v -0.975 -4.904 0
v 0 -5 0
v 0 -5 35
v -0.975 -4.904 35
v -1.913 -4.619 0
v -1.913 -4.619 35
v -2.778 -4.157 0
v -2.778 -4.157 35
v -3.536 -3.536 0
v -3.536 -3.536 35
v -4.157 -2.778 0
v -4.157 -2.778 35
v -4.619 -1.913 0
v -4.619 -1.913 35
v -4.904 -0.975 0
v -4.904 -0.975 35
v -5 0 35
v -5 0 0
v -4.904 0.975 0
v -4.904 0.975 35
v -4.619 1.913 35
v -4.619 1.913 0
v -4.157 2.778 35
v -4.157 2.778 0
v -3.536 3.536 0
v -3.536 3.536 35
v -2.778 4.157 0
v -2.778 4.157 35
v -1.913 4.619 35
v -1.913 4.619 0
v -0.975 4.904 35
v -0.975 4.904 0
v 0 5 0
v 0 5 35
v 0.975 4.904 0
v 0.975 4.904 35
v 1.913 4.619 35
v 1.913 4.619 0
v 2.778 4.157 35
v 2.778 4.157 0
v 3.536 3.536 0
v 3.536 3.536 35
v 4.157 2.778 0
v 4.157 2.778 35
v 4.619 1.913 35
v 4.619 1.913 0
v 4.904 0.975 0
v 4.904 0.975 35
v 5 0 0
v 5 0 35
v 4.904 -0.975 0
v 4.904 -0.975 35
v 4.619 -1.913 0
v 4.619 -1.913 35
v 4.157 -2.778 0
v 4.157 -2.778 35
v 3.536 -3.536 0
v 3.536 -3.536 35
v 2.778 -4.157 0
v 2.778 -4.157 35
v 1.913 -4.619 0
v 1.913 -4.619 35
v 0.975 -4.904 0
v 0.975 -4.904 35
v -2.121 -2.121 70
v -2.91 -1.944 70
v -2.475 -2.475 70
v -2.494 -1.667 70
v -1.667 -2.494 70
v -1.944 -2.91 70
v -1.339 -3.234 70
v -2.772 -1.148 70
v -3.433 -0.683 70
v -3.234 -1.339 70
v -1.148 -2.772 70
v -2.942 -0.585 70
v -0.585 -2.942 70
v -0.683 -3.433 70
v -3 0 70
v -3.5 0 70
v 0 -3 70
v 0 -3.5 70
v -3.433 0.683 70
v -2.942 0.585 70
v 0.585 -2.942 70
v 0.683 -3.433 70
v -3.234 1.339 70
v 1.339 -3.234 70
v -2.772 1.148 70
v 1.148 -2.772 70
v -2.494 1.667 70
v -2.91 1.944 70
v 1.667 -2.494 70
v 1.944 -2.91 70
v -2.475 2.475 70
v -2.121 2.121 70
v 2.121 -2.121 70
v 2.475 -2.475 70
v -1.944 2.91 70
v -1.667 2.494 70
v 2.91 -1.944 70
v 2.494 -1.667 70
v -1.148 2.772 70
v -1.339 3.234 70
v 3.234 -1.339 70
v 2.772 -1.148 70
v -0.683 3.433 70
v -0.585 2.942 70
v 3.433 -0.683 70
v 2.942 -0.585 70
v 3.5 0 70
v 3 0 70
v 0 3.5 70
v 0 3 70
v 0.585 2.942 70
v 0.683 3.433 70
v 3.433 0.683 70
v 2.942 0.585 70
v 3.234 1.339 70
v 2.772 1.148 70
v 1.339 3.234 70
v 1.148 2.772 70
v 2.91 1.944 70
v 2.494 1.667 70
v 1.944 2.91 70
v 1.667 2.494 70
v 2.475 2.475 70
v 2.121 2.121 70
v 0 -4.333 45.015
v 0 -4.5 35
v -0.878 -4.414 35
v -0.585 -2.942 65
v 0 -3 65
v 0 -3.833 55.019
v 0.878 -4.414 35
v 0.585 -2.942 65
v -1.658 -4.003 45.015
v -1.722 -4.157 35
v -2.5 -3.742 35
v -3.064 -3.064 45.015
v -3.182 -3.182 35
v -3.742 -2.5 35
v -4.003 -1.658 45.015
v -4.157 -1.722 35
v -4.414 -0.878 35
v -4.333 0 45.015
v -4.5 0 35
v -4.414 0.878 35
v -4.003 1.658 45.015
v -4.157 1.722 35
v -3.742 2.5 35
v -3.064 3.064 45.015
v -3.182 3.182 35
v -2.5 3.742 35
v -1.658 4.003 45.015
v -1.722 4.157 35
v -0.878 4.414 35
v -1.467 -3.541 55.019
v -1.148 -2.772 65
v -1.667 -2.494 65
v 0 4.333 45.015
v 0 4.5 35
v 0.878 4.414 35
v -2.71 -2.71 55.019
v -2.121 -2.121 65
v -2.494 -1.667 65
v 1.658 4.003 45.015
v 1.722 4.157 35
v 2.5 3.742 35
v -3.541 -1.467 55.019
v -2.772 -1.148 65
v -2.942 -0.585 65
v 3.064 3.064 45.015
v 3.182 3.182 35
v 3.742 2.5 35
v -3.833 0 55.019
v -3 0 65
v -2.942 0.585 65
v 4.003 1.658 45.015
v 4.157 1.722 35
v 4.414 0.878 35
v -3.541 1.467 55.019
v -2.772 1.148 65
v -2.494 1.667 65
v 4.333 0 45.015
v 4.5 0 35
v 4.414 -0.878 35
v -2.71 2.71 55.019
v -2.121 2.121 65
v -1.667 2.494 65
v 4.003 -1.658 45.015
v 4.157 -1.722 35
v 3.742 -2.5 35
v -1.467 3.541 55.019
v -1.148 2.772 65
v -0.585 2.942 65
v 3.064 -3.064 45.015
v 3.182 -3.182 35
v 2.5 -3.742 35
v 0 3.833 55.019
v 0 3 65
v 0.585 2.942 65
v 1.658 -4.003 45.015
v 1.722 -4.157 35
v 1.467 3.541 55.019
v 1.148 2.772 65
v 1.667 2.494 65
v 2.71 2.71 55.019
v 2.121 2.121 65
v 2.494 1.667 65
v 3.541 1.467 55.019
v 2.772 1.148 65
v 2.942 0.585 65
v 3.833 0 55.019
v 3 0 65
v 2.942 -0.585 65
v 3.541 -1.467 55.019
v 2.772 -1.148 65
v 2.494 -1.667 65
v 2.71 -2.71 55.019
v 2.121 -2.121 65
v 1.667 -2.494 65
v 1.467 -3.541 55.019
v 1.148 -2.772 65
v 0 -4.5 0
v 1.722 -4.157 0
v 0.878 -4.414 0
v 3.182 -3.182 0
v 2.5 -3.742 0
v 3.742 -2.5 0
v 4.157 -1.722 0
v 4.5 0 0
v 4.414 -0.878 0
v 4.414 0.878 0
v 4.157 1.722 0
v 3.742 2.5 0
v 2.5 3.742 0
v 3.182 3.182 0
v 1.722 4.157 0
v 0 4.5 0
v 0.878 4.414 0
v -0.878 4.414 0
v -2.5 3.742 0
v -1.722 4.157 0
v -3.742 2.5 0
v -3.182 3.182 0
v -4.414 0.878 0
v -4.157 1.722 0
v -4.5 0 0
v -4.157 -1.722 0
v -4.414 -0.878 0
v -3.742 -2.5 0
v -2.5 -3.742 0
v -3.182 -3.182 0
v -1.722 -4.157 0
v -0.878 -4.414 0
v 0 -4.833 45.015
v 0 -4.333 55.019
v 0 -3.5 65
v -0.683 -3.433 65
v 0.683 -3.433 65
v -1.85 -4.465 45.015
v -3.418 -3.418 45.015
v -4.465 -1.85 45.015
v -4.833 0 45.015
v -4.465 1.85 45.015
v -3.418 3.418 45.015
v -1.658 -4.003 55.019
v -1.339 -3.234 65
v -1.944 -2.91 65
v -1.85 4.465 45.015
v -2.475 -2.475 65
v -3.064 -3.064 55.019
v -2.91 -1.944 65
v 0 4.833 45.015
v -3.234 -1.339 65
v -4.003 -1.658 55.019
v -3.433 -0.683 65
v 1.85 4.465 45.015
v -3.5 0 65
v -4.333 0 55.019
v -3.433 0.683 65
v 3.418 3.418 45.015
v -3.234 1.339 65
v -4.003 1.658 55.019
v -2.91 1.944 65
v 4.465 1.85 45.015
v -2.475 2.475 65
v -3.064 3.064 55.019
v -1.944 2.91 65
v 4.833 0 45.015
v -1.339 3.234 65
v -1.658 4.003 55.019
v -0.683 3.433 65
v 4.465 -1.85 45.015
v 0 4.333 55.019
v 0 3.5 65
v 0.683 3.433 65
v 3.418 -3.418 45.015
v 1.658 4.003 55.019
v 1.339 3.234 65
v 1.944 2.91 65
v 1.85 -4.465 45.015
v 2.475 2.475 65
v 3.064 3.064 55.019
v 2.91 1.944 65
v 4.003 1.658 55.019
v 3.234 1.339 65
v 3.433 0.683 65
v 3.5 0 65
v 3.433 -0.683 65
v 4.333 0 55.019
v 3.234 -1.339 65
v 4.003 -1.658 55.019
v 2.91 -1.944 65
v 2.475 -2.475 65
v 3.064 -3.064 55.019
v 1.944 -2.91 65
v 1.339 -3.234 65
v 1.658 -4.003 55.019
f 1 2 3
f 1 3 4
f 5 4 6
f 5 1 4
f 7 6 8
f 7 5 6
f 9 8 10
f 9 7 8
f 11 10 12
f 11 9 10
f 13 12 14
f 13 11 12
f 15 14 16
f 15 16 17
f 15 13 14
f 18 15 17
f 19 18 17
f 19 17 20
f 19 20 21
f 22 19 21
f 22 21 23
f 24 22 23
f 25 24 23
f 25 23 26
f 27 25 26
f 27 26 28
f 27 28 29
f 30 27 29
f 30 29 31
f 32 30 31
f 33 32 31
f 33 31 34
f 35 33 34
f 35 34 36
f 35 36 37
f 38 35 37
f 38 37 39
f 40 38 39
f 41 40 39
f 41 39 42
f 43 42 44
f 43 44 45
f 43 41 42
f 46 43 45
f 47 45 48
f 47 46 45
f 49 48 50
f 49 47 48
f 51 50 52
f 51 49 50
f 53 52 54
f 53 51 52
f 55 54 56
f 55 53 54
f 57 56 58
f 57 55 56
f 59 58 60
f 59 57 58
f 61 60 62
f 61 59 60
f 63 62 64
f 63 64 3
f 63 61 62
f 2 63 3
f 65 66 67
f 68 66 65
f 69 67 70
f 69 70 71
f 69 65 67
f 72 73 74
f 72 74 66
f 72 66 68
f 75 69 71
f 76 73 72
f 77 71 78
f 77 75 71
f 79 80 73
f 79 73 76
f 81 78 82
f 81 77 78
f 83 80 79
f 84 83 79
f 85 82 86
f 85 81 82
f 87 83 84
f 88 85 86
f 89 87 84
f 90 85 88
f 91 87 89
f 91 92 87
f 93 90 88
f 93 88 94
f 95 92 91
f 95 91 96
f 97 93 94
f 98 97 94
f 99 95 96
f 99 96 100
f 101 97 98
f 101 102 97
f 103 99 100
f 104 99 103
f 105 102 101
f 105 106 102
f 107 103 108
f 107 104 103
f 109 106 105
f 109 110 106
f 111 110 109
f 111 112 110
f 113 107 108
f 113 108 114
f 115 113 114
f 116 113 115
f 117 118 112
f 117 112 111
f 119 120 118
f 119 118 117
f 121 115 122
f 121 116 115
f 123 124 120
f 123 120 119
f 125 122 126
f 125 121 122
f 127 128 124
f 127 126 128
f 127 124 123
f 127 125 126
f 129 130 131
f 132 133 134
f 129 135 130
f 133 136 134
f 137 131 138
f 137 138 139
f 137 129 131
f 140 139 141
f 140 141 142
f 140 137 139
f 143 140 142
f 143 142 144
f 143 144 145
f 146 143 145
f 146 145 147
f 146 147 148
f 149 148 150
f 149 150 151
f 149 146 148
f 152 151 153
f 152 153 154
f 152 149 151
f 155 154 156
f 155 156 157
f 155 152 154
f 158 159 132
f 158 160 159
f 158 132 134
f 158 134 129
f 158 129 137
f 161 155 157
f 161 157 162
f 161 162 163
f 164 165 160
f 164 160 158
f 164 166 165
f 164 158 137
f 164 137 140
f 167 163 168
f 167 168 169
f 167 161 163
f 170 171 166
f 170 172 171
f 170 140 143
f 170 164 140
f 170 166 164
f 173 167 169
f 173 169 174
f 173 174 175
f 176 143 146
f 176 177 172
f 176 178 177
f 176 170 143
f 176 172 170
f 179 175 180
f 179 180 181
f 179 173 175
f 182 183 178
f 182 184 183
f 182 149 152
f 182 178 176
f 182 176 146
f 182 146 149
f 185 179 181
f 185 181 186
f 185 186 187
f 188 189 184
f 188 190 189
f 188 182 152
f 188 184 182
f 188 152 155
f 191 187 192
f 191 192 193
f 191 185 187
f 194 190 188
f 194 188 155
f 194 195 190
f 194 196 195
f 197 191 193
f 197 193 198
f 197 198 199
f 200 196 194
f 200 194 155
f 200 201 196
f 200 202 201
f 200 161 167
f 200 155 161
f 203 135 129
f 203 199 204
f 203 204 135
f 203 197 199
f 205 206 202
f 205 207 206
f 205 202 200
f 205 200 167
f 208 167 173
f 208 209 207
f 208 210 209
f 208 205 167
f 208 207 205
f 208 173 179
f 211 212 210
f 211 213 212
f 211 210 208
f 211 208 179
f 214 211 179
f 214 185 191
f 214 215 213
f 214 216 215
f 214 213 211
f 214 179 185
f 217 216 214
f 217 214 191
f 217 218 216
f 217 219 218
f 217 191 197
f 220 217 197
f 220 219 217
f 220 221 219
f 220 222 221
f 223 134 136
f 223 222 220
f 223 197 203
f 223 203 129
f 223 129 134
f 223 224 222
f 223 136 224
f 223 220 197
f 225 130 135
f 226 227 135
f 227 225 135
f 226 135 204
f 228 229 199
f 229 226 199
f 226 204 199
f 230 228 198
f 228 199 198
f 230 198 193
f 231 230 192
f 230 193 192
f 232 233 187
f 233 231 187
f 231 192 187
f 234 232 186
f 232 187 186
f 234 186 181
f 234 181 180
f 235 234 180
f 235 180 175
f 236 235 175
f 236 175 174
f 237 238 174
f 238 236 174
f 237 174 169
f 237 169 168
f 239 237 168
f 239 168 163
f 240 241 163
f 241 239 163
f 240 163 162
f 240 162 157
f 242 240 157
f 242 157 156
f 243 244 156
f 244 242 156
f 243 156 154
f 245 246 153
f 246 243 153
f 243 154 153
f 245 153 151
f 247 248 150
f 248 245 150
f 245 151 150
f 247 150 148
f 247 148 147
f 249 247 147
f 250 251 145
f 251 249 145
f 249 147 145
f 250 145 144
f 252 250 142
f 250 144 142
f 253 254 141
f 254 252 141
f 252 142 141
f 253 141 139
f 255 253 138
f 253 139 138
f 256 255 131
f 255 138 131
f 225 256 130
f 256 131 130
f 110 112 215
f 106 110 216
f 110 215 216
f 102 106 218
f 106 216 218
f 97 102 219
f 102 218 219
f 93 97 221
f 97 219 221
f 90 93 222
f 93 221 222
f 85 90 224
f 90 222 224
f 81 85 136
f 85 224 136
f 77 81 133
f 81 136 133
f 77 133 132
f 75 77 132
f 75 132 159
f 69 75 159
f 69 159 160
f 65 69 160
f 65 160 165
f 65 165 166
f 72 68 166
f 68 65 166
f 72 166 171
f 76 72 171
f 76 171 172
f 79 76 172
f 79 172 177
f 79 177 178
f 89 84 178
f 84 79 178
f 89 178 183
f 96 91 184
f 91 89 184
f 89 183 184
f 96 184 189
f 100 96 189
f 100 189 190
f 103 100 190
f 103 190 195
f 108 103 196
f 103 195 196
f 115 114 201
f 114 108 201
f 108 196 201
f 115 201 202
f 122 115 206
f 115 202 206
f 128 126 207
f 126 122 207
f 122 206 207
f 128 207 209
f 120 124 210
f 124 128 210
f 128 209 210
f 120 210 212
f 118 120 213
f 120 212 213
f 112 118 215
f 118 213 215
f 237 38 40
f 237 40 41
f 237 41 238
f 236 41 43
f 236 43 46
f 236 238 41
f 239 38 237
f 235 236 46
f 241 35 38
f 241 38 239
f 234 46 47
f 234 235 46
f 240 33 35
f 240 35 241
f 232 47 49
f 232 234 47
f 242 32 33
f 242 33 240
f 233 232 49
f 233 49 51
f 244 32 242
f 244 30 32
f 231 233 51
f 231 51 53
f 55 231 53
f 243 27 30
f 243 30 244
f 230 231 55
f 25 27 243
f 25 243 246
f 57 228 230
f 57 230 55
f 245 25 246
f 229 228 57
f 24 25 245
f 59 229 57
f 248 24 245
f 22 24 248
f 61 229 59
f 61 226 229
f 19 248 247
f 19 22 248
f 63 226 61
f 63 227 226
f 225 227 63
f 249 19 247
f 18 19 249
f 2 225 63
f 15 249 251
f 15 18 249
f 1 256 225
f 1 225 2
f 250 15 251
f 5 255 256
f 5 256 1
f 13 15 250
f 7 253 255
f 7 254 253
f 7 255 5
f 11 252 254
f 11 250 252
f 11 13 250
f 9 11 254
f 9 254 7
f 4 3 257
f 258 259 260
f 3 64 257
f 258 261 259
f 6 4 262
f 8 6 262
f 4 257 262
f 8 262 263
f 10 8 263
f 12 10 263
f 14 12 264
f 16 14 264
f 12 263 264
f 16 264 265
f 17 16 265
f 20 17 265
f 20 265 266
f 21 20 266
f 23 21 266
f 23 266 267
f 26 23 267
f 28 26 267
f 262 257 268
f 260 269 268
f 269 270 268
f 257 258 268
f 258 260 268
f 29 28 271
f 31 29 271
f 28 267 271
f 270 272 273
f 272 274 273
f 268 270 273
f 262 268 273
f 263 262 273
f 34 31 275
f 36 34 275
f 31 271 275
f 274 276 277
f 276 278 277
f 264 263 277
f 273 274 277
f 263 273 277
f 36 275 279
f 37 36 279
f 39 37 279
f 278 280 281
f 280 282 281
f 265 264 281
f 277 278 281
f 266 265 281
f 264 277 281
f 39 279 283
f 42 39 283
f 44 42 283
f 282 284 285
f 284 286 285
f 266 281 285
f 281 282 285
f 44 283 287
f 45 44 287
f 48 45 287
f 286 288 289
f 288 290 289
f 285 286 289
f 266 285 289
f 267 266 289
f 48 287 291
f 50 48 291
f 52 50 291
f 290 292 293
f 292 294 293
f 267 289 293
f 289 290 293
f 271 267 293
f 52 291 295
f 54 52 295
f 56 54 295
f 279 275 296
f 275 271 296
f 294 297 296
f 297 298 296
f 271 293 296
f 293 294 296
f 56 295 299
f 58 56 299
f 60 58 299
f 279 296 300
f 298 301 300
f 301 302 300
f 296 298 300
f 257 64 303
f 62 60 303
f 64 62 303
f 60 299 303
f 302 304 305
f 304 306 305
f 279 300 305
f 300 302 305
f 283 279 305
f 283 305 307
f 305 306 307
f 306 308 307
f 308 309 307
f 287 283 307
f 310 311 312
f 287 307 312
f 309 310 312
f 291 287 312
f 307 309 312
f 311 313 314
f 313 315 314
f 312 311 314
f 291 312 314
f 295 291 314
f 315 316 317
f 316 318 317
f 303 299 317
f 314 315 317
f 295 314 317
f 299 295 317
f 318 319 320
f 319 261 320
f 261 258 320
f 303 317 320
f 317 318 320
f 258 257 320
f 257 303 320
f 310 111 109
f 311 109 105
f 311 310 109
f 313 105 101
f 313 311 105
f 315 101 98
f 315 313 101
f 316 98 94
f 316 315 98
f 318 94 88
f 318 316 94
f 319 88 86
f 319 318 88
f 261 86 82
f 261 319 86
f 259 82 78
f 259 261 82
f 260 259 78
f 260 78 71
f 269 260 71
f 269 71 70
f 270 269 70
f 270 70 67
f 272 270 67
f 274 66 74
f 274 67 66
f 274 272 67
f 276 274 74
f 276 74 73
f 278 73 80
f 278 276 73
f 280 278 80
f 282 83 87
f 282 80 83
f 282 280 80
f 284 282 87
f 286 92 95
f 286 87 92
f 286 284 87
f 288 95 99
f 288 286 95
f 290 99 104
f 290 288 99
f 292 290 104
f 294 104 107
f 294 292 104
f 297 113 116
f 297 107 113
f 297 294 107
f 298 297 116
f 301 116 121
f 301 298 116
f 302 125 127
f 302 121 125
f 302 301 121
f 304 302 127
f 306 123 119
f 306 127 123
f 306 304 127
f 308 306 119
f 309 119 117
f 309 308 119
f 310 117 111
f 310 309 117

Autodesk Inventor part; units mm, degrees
ref_plane "YZ Plane" through (0, 0, 0) normal (1, 0, 0) x (0, 1, 0)
ref_plane "XZ Plane" through (0, 0, 0) normal (0, 1, 0) x (-1, 0, 0)
sketch "Sketch1" plane through (0, 0, 0) normal (0, 0, 1) x (1, 0, 0)
  circle A0 centre (0, 0) radius 4.5
  circle A1 centre (0, 0) radius 5
  line L0 (0, 0) -> (0, -5)
  dimension "d0" = 9
  dimension "d1" = 0.5
ref_plane "Work Plane1" through (0, 0, 35) normal (0, 0, 1) x (1, 0, 0)
ref_plane "Work Plane2" through (0, 0, 65) normal (0, 0, 1) x (1, 0, 0)
sketch "Sketch3" plane through (0, 0, 65) normal (0, 0, 1) x (1, 0, 0)
  circle A0 centre (0, 0) radius 3
  circle A1 centre (0, 0) radius 3.5
  line L0 (0, 0) -> (0, -3.5)
  dimension "d4" = 0.5
  dimension "d5" = 6
sketch "Sketch2" plane through (0, 0, 35) normal (0, 0, 1) x (1, 0, 0)
  circle A0 centre (0, 0) radius 5 projected
  circle A1 centre (0, 0) radius 4.5 projected
  line L0 (0, 0) -> (0, -5)
ref_plane "Work Plane3" through (0, 0, 0) normal (-1, 0, 0) x (0, -1, 0)
sketch "Sketch4" plane through (0, 0, 0) normal (-1, 0, 0) x (0, -1, 0)
  line L0 (5, 35) -> (5, 0)
  line L1 (5, 0) -> (4.5, 0)
  line L2 (4.5, 0) -> (4.5, 35)
  arc A0 (5, 35) -> (3.5, 65) centre (-295.75, 35) ccw
  line L3 (5, 0) -> (-5, 0) projected
  line L4 (4.5, 0) -> (-4.5, 0) projected
  line L5 (0, 0) -> (5, 0) projected
  line L6 (5, 35) -> (-5, 35) projected
  line L7 (0, 35) -> (5, 35) projected
  line L8 (4.5, 35) -> (-4.5, 35) projected
  line L9 (0, 65) -> (3.5, 65) projected
  line L10 (3.5, 65) -> (-3.5, 65) projected
  line L11 (3, 65) -> (-3, 65) projected
  line L12 (3.5, 65) -> (3, 65)
  arc A1 (4.5, 35) -> (3, 65) centre (-296.25, 35) ccw
  line L13 (0, 65) -> (0, 0)
revolve "Revolution2" add sketch "Sketch4" angle 360 about axis through (0, 0, 65) along (0, 0, -1) contours L6 A1 L9 A0 | L0 L1 L2 L6
sketch "Sketch5" plane through (0, 0, 65) normal (0, 0, 1) x (1, 0, 0)
  circle A0 centre (0, 0) radius 3.5
  circle A1 centre (0, 0) radius 2
  circle A2 centre (0, 0) radius 3 projected
  dimension "d21" = 4
extrude "Extrusion1" add sketch "Sketch5" along normal blind 5 contours A0
properties part number "Hand"
